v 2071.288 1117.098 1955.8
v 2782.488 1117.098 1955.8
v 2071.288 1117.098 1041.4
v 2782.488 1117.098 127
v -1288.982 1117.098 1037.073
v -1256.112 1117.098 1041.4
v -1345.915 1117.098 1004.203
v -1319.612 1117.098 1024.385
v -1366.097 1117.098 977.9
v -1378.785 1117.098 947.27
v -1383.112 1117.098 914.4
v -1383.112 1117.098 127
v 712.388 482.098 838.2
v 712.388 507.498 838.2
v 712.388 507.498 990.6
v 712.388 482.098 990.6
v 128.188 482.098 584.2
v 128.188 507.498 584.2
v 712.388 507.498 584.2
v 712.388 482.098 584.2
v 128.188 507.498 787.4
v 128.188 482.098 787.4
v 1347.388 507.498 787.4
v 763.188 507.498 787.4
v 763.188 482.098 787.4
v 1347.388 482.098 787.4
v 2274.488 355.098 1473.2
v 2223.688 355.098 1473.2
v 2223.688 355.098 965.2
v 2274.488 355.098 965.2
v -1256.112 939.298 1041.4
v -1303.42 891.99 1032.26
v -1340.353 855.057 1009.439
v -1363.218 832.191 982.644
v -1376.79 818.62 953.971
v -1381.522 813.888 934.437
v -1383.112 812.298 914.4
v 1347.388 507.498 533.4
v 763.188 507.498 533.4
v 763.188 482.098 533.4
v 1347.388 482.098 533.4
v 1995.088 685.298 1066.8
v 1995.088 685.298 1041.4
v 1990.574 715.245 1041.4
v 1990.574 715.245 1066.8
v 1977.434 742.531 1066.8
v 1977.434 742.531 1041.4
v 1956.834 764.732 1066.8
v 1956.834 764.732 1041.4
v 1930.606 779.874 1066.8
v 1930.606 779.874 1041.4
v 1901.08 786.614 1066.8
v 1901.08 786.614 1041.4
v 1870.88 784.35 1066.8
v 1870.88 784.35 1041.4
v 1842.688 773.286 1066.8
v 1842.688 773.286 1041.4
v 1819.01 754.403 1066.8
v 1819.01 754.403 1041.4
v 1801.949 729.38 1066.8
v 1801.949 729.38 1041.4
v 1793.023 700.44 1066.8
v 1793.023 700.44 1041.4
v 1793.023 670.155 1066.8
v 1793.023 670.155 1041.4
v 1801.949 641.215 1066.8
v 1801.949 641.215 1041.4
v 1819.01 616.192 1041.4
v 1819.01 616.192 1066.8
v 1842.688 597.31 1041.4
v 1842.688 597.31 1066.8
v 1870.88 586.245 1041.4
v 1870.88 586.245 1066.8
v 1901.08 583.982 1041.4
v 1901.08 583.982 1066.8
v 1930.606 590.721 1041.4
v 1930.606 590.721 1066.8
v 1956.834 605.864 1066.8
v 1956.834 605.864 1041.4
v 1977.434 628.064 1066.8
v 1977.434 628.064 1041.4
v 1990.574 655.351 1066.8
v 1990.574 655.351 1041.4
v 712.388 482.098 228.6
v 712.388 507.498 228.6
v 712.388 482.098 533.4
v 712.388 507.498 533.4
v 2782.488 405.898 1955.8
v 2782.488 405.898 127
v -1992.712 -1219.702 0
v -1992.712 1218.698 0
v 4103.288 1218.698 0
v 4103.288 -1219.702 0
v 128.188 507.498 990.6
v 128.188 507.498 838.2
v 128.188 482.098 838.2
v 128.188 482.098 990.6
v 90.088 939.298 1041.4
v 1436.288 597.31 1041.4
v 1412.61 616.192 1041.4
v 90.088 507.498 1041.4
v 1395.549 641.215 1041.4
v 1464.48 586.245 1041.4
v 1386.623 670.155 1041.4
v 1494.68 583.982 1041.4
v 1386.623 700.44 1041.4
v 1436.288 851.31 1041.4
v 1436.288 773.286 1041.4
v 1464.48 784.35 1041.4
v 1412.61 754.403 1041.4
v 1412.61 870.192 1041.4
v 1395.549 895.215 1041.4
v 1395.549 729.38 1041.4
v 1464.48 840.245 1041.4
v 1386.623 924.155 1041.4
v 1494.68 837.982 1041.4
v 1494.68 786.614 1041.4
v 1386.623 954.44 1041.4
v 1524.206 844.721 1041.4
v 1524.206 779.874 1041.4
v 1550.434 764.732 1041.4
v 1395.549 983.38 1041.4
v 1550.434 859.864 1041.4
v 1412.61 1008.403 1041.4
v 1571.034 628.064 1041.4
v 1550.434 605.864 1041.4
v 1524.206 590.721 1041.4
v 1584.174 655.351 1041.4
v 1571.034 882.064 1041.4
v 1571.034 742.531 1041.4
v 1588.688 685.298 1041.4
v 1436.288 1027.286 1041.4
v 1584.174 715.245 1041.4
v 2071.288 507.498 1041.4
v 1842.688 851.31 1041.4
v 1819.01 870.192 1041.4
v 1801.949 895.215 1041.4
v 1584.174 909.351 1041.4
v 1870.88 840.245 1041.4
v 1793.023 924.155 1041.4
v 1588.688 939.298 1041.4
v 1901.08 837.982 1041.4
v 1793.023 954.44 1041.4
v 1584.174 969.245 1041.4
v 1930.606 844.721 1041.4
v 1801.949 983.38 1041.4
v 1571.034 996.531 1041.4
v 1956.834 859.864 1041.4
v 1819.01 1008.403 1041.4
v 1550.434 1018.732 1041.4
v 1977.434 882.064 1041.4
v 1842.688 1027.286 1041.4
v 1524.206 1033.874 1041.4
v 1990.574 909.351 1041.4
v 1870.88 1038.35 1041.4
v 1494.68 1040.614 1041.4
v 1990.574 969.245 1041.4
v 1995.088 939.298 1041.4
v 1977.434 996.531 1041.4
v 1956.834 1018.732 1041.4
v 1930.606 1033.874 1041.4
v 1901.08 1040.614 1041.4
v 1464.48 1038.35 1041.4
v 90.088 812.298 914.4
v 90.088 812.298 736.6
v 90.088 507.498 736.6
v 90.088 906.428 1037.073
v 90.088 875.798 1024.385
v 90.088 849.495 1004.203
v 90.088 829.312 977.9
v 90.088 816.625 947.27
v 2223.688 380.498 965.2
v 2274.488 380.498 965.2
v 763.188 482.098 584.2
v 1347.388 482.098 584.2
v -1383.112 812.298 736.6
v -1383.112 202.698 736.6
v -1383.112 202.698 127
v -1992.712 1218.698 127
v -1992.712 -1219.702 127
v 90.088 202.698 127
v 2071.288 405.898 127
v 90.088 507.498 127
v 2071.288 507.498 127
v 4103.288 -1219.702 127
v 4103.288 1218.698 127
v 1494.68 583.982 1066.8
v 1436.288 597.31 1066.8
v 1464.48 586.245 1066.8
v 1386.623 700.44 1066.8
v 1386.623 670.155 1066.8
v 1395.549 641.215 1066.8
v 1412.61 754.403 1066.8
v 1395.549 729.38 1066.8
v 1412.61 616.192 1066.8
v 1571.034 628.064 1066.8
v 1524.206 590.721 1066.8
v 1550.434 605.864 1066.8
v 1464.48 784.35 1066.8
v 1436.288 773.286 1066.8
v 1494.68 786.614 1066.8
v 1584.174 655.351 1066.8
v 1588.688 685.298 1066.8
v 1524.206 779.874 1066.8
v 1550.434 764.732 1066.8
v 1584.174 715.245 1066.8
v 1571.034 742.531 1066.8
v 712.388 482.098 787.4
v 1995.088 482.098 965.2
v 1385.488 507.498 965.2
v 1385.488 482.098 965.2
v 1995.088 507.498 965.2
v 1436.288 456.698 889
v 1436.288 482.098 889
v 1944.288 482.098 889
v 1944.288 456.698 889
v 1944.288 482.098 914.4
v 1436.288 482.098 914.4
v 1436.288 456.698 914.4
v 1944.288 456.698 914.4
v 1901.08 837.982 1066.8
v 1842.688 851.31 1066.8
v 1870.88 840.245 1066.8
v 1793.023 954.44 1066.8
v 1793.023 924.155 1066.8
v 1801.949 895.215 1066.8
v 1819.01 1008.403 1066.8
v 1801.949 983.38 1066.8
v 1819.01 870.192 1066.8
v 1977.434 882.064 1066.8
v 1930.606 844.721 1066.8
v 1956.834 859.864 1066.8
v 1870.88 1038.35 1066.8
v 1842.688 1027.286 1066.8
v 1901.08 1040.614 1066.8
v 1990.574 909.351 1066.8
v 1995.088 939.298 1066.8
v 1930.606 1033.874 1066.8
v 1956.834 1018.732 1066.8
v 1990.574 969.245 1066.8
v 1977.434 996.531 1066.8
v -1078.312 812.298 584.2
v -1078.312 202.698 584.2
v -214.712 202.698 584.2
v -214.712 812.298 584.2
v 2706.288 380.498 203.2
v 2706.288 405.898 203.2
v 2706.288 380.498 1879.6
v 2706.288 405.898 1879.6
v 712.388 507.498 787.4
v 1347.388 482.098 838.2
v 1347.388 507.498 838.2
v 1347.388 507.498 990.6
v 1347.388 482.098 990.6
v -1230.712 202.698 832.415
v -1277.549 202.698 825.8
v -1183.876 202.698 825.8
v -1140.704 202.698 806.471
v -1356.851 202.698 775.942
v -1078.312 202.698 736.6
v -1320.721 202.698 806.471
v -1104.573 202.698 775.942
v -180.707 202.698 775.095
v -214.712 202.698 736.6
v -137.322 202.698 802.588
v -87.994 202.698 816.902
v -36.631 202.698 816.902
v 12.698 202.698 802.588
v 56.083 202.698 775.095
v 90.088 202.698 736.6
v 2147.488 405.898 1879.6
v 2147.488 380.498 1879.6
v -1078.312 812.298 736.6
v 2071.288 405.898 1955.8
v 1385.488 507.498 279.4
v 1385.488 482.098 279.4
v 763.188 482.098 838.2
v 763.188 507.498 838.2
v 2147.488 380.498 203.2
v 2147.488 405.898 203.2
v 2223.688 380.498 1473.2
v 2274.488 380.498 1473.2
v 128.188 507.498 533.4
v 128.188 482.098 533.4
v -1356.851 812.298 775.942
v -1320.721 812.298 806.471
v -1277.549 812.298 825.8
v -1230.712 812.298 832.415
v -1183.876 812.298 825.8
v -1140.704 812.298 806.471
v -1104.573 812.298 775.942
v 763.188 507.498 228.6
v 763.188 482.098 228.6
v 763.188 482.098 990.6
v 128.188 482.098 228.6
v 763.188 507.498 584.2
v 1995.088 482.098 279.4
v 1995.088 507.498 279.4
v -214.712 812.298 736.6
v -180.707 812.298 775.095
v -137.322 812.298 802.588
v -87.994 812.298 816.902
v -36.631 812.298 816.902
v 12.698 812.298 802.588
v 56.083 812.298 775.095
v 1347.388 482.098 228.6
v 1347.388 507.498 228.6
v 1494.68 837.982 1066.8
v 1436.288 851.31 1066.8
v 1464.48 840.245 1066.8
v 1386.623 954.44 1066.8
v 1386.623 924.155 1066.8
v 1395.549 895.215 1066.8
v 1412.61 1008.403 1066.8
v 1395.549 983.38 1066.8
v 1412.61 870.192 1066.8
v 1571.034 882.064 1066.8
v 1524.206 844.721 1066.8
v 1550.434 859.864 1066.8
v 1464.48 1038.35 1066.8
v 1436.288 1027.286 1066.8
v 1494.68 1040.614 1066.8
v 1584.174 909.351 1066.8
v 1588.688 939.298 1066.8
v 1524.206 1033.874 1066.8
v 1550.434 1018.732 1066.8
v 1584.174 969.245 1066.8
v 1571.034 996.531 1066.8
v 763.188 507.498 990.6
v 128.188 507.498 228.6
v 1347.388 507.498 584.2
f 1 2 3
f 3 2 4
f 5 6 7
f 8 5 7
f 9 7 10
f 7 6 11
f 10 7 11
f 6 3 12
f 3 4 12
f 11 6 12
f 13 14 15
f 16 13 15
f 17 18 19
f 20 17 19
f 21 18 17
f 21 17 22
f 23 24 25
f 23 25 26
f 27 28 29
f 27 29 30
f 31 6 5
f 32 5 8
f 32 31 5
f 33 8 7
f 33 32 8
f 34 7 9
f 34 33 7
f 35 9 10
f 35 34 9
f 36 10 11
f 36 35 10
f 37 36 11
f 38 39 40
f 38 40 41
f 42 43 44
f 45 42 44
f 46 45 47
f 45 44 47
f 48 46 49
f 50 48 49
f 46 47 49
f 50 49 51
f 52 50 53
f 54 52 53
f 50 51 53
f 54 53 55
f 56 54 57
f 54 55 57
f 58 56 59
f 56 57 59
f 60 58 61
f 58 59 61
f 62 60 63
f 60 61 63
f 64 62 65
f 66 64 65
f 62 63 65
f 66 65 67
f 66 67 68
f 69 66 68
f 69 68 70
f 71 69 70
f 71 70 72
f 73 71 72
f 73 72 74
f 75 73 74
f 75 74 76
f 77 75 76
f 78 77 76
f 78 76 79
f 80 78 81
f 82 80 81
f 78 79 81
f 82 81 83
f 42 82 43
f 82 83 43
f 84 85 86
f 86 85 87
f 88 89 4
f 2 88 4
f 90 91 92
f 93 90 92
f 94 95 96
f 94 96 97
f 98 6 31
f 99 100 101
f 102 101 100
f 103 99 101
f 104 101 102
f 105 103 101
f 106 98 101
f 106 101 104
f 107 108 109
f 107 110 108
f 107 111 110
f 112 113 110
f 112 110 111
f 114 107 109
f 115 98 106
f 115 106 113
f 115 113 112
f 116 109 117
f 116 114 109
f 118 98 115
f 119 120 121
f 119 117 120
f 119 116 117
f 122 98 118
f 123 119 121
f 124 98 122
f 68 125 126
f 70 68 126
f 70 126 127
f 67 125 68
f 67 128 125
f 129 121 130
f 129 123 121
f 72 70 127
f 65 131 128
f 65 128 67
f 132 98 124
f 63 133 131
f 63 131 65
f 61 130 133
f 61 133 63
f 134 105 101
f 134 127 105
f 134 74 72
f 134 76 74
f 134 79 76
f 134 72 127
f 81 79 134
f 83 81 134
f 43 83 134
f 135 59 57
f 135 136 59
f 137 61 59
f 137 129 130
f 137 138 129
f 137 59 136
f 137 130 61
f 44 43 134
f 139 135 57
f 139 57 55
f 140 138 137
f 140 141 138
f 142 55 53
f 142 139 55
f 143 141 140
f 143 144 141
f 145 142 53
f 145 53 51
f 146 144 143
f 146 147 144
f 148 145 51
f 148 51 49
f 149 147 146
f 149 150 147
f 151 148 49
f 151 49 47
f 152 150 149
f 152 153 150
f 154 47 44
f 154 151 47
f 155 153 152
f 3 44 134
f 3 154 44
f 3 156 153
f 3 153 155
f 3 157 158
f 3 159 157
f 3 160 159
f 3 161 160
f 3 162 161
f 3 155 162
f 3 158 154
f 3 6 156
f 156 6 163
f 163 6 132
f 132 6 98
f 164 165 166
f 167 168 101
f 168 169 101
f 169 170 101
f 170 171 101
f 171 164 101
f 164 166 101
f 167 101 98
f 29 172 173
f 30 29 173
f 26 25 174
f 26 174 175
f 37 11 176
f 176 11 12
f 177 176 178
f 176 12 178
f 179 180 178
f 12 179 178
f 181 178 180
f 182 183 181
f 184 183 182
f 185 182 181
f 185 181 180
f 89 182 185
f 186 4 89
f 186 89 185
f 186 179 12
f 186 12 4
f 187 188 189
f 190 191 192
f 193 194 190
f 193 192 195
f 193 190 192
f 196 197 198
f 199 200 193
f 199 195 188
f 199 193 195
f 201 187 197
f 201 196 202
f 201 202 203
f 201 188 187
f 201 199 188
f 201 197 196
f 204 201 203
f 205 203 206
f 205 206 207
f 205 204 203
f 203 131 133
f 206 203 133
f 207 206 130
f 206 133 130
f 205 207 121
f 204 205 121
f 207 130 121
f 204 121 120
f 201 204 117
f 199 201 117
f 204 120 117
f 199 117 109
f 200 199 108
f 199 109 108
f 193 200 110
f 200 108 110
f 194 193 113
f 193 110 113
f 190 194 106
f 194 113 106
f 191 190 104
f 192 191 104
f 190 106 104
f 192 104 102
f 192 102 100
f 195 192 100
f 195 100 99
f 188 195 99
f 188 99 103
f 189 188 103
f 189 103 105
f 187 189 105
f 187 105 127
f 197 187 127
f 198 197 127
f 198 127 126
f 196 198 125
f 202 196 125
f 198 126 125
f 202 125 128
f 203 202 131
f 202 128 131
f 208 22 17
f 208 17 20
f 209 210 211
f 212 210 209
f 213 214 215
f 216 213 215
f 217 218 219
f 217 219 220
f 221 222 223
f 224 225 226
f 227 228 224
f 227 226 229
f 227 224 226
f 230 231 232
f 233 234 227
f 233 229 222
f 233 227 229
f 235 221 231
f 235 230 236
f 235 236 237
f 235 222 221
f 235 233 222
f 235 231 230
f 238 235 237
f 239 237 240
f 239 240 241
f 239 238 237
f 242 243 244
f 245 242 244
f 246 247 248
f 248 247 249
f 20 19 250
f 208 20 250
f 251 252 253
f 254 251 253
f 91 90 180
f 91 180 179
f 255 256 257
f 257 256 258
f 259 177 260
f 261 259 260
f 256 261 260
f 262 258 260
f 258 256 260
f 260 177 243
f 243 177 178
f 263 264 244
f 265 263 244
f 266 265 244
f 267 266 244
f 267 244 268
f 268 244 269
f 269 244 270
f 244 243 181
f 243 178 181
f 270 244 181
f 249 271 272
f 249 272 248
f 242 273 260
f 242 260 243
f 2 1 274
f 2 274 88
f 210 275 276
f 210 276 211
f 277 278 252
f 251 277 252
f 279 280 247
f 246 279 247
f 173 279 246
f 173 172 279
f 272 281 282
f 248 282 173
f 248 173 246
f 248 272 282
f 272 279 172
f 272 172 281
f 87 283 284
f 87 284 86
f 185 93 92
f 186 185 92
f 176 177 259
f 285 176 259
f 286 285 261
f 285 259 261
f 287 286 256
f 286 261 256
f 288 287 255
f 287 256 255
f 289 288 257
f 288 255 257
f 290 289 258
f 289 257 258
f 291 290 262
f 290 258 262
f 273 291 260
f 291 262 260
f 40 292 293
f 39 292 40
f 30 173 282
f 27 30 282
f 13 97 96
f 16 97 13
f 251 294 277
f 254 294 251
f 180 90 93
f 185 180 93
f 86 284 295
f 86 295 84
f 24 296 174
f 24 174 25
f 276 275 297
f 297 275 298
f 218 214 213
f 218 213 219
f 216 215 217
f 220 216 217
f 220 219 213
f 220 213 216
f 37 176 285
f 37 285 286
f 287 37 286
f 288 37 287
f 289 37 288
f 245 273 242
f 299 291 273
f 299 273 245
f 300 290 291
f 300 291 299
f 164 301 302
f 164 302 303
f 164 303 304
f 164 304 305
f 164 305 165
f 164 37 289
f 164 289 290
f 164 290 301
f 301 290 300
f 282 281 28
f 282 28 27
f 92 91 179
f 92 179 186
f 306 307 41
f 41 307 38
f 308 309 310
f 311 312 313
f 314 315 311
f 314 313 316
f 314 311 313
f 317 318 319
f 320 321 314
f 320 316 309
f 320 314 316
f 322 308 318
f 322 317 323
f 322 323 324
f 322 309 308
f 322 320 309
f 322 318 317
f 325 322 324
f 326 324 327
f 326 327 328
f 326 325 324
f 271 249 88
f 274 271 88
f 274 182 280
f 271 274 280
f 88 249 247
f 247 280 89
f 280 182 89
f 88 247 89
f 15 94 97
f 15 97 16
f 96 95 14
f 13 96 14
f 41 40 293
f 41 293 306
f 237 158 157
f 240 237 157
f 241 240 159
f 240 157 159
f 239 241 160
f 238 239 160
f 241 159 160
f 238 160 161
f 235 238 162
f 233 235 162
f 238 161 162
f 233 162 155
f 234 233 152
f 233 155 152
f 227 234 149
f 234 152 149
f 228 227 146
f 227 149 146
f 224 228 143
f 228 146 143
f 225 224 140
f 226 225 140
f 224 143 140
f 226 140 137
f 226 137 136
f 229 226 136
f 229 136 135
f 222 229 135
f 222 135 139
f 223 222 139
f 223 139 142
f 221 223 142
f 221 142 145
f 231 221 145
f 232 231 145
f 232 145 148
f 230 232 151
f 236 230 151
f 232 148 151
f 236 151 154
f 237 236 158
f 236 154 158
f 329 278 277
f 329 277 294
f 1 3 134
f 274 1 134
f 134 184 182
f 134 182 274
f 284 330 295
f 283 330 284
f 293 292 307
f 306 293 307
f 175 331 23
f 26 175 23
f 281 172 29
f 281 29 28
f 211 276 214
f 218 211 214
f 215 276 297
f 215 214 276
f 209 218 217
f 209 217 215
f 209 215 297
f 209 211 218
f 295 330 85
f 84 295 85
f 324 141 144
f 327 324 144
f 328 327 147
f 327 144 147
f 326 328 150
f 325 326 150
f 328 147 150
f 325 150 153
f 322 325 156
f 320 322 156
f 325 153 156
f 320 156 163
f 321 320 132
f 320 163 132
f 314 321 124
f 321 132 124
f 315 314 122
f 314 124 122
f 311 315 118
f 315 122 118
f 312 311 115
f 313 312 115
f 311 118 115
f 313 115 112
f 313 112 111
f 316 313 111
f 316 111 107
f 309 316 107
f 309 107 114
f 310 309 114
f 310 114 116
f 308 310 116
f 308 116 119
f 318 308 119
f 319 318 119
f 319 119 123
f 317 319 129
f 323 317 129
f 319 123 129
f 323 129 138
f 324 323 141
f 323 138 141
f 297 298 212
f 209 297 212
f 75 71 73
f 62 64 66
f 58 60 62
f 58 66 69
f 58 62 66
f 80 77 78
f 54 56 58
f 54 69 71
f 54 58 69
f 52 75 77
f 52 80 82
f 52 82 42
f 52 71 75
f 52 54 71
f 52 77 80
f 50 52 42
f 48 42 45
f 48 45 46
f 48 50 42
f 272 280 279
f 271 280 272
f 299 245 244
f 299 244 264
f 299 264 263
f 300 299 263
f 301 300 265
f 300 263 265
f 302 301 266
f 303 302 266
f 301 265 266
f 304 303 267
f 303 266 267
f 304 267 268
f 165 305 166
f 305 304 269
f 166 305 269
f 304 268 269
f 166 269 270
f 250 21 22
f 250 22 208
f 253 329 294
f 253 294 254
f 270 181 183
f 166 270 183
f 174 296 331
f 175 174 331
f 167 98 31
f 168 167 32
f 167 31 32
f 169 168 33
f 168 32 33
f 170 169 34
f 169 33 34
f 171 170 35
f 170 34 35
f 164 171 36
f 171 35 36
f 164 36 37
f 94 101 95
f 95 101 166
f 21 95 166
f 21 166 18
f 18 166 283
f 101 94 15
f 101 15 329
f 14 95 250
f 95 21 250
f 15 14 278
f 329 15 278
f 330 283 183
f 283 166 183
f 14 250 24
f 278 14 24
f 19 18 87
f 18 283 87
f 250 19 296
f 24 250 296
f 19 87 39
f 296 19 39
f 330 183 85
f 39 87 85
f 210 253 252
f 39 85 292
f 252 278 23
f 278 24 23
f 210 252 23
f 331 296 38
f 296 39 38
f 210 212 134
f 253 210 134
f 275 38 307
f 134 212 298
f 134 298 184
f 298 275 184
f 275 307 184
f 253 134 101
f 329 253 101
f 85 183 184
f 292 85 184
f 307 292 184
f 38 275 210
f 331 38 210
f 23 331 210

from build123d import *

# Parameters (mm, degrees)
F0_W      = 6096
F0_H      = 2438.4
F1_DEPTH  = 127
F2_W      = 1219.2
F2_H      = 609.6
F2_W_2    = 762
F3_DEPTH  = 914.4
F4_DEPTH  = 1828.8
F5_R      = 101.6
F6_DEPTH  = 25.4
F7_W      = 609.6
F7_H      = 685.8
F8_DEPTH  = 25.4
F9_W      = 508
F9_H      = 25.4
F10_DEPTH = 25.4
F11_W     = 558.8
F11_H     = 1676.4
F12_DEPTH = 25.4
F13_W     = 50.8
F13_H     = 508
F14_DEPTH = 25.4
F15_W     = 584.2
F15_H     = 152.4
F15_H_2   = 203.2
F15_H_3   = 304.8
F16_DEPTH = 25.4
F18_DEPTH = 609.6
F19_R     = 127


with BuildPart() as f1:
    # F0 (on Top) → F1 (new body)
    with BuildSketch(Plane.XY):
        with Locations((1055.2877792192, -0.5022957921)):
            Rectangle(F0_W, F0_H)
    extrude(amount=F1_DEPTH)

    # F2 (on face) → F3 (join)
    with BuildSketch(Plane.XY.offset(127)):
        Polygon((90.0877792192, 1117.0977042079), (-1383.1122207808, 1117.0977042079), (-1383.1122207808, 507.4977042079), (-1383.1122207808, 202.6977042079), (90.0877792192, 202.6977042079), (90.0877792192, 507.4977042079), align=None)
        with Locations((699.6877792192, 812.2977042079)):
            Rectangle(F2_W, F2_H)
        with Locations((1690.2877792192, 812.2977042079)):
            Rectangle(F2_W_2, F2_H)
    extrude(amount=F3_DEPTH)

    # F2 (on face) → F4 (join)
    with BuildSketch(Plane.XY.offset(127)):
        Polygon((2782.4877792192, 1117.0977042079), (2071.2877792192, 1117.0977042079), (2071.2877792192, 507.4977042079), (2071.2877792192, 405.8977042079), (2782.4877792192, 405.8977042079), align=None)
    extrude(amount=F4_DEPTH)

    # F5 (on face) → F6 (join)
    with BuildSketch(Plane.XY.offset(1041.4)):
        with Locations((1893.4877792192, 939.2977042079)):
            Circle(F5_R)
        with Locations((1487.0877792192, 939.2977042079)):
            Circle(F5_R)
        with Locations((1487.0877792192, 685.2977042079)):
            Circle(F5_R)
        with Locations((1893.4877792192, 685.2977042079)):
            Circle(F5_R)
    extrude(amount=F6_DEPTH)

    # F7 (on face) → F8 (join)
    with BuildSketch(Plane.XZ.offset(-507.4977042079)):
        with Locations((1690.2877792192, 622.3)):
            Rectangle(F7_W, F7_H)
    extrude(amount=F8_DEPTH)

    # F9 (on face) → F10 (join)
    with BuildSketch(Plane.XZ.offset(-482.0977042079)):
        with Locations((1690.2877792192, 901.7)):
            Rectangle(F9_W, F9_H)
    extrude(amount=F10_DEPTH)

    # F11 (on face) → F12 (join)
    with BuildSketch(Plane.XZ.offset(-405.8977042079)):
        with Locations((2426.8877792192, 1041.4)):
            Rectangle(F11_W, F11_H)
    extrude(amount=F12_DEPTH)

    # F13 (on face) → F14 (join)
    with BuildSketch(Plane.XZ.offset(-380.4977042079)):
        with Locations((2249.0877792192, 1219.2)):
            Rectangle(F13_W, F13_H)
    extrude(amount=F14_DEPTH)

    # F15 (on face) → F16 (join)
    with BuildSketch(Plane.XZ.offset(-507.4977042079)):
        with Locations((420.2877792192, 914.4)):
            Rectangle(F15_W, F15_H)
        with Locations((1055.2877792192, 914.4)):
            Rectangle(F15_W, F15_H)
        with Locations((420.2877792192, 685.8)):
            Rectangle(F15_W, F15_H_2)
        with Locations((1055.2877792192, 685.8)):
            Rectangle(F15_W, F15_H_2)
        with Locations((420.2877792192, 381)):
            Rectangle(F15_W, F15_H_3)
        with Locations((1055.2877792192, 381)):
            Rectangle(F15_W, F15_H_3)
    extrude(amount=F16_DEPTH)

    # F17 (on face) → F18 (cut)
    with BuildSketch(Plane.XZ.offset(-202.6977042079)):
        with BuildLine():
            Line((-1383.1122207808, 1041.4), (-1383.1122207808, 736.6))
            ThreePointArc((-1383.1122207808, 736.6), (-1230.7122207808, 832.4148533749), (-1078.3122207808, 736.6))
            Line((-1078.3122207808, 736.6), (-1078.3122207808, 584.2))
            Line((-1078.3122207808, 584.2), (-214.7122207808, 584.2))
            Line((-214.7122207808, 584.2), (-214.7122207808, 736.6))
            ThreePointArc((-214.7122207808, 736.6), (-62.3122207808, 818.7177664051), (90.0877792192, 736.6))
            Line((90.0877792192, 736.6), (90.0877792192, 1041.4))
            Line((90.0877792192, 1041.4), (-1383.1122207808, 1041.4))
        make_face()
    extrude(amount=-F18_DEPTH, mode=Mode.SUBTRACT)

    # F19
    f19_edges = [f1.edges().sort_by_distance(p)[0] for p in [
        (-646.512221, 812.297704, 1041.4),
        (-1383.112221, 964.697704, 1041.4),
    ]]
    fillet(f19_edges, radius=F19_R)


solid = f1.part
